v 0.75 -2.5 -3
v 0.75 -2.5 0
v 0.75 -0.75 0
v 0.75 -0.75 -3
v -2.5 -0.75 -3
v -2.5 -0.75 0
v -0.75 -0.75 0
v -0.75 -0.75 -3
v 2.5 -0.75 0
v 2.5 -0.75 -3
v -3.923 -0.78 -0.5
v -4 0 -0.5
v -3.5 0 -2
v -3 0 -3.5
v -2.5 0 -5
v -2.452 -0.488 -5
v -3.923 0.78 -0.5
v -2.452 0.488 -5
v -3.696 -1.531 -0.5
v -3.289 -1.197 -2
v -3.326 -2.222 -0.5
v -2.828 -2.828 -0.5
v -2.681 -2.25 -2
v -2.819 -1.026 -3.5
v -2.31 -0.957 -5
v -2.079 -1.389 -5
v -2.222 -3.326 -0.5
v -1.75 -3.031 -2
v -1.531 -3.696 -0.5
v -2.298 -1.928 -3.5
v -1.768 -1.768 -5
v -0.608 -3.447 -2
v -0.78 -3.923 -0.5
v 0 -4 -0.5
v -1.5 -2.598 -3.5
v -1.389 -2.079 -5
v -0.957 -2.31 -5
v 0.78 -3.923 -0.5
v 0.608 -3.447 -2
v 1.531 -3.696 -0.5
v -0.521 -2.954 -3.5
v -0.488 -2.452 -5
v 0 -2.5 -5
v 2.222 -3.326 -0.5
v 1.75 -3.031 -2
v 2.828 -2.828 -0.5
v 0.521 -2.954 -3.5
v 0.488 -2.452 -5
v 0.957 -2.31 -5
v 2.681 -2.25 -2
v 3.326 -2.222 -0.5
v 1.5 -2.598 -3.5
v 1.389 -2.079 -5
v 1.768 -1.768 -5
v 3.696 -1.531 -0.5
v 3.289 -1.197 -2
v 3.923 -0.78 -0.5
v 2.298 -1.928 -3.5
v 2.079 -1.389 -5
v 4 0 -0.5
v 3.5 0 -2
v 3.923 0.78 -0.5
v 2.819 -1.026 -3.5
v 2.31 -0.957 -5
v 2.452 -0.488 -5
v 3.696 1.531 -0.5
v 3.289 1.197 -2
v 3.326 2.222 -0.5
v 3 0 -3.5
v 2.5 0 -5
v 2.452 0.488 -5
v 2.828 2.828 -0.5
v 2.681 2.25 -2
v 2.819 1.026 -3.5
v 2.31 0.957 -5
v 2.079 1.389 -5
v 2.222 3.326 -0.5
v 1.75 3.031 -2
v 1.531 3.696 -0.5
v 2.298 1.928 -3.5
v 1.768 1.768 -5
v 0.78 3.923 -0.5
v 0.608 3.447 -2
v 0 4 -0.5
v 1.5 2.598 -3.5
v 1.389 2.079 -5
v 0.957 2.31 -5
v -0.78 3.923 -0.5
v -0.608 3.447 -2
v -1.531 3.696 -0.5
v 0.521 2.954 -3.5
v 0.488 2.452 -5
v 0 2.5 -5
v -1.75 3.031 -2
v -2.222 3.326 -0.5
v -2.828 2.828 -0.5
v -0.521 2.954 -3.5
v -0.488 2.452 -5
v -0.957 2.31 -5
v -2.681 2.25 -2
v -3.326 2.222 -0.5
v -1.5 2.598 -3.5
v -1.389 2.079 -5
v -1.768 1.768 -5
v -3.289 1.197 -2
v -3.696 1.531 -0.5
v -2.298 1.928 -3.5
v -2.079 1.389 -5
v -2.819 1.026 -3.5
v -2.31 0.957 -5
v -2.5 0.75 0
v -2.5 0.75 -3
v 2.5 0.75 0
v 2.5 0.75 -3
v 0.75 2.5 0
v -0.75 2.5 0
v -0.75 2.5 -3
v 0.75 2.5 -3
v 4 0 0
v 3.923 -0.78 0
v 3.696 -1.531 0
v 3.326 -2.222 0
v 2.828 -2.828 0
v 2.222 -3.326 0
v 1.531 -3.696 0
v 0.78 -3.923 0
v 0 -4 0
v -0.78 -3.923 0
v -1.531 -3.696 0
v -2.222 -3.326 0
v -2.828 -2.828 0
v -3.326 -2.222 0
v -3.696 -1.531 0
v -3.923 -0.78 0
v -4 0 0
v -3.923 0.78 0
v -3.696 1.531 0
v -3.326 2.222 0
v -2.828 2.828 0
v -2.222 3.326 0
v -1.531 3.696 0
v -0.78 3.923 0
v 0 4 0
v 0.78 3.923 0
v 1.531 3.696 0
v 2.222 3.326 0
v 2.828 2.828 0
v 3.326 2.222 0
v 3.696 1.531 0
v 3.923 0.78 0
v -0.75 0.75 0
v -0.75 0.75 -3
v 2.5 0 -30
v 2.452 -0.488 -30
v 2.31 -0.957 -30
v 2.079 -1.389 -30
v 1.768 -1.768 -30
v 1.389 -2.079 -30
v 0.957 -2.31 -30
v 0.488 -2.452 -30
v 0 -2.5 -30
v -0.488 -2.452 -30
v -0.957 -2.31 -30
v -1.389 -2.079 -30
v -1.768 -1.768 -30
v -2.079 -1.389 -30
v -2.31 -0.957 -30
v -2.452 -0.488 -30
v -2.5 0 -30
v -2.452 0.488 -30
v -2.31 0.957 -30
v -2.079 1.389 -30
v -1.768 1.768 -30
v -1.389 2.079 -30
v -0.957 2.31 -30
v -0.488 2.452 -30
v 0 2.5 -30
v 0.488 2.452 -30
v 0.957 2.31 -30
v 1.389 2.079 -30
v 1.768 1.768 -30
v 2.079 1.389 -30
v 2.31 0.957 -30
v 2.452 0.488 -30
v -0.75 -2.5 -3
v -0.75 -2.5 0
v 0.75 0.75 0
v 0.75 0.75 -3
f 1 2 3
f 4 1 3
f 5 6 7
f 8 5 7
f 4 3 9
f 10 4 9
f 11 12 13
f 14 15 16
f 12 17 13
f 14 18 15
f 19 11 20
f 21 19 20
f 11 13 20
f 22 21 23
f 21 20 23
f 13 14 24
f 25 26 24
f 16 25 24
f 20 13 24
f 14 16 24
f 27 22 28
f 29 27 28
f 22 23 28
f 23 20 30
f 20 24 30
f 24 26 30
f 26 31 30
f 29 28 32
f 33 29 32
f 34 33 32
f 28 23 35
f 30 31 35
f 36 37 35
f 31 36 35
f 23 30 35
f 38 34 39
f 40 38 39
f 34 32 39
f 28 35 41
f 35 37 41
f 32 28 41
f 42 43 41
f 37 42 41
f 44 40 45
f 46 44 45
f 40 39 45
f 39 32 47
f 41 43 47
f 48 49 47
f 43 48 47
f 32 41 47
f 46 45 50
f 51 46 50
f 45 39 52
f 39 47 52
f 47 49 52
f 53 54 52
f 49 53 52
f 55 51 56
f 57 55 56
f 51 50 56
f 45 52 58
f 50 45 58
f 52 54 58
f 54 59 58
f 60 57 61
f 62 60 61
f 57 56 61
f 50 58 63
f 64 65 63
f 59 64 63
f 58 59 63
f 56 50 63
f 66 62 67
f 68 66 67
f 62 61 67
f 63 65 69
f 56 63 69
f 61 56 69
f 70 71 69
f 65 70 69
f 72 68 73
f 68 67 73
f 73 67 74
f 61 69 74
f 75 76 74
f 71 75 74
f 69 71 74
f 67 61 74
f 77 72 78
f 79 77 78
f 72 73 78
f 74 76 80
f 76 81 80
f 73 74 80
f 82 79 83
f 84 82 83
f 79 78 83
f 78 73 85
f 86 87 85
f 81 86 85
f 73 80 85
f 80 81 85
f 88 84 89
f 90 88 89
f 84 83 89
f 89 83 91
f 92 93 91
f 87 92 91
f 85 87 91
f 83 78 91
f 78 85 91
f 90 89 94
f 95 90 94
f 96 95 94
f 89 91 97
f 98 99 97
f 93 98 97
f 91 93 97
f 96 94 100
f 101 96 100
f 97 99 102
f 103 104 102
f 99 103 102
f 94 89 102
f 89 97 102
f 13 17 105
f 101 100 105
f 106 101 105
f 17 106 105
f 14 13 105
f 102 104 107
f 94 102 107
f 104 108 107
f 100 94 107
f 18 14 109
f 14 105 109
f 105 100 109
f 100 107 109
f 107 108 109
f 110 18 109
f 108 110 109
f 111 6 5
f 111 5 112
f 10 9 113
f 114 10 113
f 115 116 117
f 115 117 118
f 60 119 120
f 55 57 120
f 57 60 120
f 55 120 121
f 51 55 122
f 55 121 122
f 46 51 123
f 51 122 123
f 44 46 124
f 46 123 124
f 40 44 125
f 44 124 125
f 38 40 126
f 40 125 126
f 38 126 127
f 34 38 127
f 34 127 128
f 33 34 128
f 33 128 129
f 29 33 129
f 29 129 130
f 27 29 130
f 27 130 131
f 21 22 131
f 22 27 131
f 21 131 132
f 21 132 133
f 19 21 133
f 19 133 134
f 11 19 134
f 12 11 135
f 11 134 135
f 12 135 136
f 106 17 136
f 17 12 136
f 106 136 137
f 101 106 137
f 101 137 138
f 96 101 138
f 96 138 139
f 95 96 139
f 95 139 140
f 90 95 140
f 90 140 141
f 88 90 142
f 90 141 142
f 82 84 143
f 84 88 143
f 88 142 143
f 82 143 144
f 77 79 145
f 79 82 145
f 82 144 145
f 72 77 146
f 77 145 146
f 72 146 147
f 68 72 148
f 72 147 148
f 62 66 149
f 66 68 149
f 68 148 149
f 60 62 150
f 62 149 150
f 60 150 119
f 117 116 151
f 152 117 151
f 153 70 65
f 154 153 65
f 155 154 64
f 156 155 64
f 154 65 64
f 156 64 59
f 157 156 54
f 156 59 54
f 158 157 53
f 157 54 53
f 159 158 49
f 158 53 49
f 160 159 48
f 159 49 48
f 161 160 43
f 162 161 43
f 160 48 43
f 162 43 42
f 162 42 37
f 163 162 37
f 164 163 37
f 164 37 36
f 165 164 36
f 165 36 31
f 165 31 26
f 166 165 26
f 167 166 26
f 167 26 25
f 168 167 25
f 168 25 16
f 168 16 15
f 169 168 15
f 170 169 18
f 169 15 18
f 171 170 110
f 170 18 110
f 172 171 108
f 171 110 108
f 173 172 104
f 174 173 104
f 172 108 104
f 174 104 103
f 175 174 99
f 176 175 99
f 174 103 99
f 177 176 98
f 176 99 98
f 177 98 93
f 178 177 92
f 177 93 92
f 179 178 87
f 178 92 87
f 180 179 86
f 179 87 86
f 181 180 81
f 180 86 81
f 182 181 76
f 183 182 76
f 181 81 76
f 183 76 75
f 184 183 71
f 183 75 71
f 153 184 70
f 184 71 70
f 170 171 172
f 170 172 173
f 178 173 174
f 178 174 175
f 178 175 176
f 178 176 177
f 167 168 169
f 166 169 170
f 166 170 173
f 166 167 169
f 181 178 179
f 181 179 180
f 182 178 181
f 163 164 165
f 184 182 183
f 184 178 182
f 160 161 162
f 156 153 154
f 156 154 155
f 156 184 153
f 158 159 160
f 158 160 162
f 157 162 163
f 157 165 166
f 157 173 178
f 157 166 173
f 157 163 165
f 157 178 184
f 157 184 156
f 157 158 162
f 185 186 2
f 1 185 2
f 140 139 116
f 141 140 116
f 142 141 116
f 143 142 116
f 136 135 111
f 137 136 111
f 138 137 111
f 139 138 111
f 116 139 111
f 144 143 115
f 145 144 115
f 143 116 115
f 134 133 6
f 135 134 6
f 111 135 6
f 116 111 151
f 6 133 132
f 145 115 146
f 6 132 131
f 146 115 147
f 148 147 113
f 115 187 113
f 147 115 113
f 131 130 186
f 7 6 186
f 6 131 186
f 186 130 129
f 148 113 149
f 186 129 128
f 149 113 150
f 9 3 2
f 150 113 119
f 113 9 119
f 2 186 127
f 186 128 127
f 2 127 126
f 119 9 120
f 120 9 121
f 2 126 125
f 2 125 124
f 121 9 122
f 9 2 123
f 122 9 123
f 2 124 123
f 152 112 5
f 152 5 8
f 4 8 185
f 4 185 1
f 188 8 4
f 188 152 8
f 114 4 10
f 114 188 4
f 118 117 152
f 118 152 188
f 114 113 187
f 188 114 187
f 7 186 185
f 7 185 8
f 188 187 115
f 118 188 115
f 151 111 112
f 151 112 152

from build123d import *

# Parameters (mm, degrees)
F0_R     = 4
F1_DEPTH = 5
F2_R     = 2.5
F3_DEPTH = 25
F6_W     = 1.75
F6_H     = 1.5
F6_W_2   = 1.5
F6_H_2   = 1.75
F7_DEPTH = 3
F9_ANGLE = 180


with BuildPart() as f1:
    # F0 (on Top) → F1 (new body)
    with BuildSketch(Plane.XY):
        Circle(F0_R)
    extrude(amount=F1_DEPTH)

    # F2 (on face) → F3 (join)
    with BuildSketch(Plane.XY.offset(5)):
        Circle(F2_R)
    extrude(amount=F3_DEPTH)

    # F4 (on Front) → F5 (revolve, cut)
    with BuildSketch(Plane.XZ):
        Polygon((-4, 0.5), (-2.5, 5), (-4, 5), align=None)
    revolve(axis=Axis((0, 0, 2.5), (0, 0, -1)), mode=Mode.SUBTRACT)

    # F6 (on face) → F7 (cut)
    with BuildSketch(Plane(origin=(0, 0, 0), x_dir=(1, 0, 0), z_dir=(0, 0, -1))):
        with Locations((1.625, 0)):
            Rectangle(F6_W, F6_H)
        Rectangle(F6_W_2, F6_H)
        with Locations((0, 1.625)):
            Rectangle(F6_W_2, F6_H_2)
        with Locations((-1.625, 0)):
            Rectangle(F6_W, F6_H)
        with Locations((0, -1.625)):
            Rectangle(F6_W_2, F6_H_2)
    extrude(amount=-F7_DEPTH, mode=Mode.SUBTRACT)


with BuildPart() as f1_1:
    # F9: moved
    add(f1.part.rotate(Axis((9.6651110798, 0, 0), (1, 0, 0)), F9_ANGLE))


solid = f1_1.part
